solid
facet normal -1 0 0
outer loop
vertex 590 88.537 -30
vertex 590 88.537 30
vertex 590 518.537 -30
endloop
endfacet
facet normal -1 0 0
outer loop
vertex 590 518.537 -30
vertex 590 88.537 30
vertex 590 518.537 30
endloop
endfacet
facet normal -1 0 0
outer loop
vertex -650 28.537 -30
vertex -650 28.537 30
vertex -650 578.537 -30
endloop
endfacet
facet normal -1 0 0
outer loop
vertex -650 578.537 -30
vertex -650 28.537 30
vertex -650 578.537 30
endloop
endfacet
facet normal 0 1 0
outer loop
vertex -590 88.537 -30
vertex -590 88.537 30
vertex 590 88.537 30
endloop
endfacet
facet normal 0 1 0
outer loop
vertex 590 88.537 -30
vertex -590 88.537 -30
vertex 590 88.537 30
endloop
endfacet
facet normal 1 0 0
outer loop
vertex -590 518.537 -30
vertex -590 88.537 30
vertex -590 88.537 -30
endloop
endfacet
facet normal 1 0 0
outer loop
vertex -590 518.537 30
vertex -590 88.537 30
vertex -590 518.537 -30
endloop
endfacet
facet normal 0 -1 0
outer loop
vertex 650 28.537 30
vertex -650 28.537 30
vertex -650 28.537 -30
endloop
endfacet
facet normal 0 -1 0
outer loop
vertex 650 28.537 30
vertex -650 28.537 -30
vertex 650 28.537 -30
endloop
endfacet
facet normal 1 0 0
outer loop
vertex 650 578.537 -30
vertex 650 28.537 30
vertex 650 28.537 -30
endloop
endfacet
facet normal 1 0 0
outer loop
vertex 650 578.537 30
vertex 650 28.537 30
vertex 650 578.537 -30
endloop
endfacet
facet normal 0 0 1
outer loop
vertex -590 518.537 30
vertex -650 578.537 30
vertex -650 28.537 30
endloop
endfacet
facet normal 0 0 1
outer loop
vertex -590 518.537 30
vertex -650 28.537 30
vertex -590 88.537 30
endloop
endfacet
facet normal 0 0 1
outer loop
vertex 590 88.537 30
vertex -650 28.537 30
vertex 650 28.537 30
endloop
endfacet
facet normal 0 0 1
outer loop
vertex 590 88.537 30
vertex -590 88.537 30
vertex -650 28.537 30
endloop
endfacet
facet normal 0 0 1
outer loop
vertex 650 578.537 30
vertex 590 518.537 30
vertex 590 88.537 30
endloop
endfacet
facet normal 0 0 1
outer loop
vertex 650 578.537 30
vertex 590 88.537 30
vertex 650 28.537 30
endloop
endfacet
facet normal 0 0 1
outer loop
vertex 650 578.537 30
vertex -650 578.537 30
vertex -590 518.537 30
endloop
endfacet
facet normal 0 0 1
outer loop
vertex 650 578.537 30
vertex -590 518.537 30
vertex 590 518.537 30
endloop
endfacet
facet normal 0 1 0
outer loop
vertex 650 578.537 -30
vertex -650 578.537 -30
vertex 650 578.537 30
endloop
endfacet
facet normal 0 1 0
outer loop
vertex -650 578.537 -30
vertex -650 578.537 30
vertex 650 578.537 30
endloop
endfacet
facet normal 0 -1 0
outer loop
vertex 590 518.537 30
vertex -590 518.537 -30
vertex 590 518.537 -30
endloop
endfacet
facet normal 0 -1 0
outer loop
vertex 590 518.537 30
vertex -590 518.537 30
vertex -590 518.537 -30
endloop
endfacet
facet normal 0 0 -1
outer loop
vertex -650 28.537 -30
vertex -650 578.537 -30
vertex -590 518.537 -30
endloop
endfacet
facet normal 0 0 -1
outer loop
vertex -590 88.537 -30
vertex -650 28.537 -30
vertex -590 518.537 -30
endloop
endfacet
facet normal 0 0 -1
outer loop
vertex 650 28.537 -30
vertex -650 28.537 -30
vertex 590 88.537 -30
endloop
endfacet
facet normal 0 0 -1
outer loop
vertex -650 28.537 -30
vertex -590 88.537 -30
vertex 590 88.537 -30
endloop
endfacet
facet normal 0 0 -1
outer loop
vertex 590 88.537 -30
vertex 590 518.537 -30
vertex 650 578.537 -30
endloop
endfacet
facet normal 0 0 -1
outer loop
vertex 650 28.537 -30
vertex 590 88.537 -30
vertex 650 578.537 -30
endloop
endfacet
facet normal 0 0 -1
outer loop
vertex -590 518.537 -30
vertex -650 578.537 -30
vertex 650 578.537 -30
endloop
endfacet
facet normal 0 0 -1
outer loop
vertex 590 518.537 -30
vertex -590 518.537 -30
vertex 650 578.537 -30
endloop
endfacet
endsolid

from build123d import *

# Parameters (mm, degrees)
F0_W     = 1300
F0_H     = 550
F0_W_2   = 1180
F0_H_2   = 430
F1_DEPTH = 30


with BuildPart() as f1:
    # F0 (on Top) → F1 (new body, symmetric)
    with BuildSketch(Plane.XY):
        with Locations((0, 303.536731)):
            Rectangle(F0_W, F0_H)
        with Locations((0, 303.536731)):
            Rectangle(F0_W_2, F0_H_2, mode=Mode.SUBTRACT)
    extrude(amount=F1_DEPTH, both=True)


solid = f1.part
